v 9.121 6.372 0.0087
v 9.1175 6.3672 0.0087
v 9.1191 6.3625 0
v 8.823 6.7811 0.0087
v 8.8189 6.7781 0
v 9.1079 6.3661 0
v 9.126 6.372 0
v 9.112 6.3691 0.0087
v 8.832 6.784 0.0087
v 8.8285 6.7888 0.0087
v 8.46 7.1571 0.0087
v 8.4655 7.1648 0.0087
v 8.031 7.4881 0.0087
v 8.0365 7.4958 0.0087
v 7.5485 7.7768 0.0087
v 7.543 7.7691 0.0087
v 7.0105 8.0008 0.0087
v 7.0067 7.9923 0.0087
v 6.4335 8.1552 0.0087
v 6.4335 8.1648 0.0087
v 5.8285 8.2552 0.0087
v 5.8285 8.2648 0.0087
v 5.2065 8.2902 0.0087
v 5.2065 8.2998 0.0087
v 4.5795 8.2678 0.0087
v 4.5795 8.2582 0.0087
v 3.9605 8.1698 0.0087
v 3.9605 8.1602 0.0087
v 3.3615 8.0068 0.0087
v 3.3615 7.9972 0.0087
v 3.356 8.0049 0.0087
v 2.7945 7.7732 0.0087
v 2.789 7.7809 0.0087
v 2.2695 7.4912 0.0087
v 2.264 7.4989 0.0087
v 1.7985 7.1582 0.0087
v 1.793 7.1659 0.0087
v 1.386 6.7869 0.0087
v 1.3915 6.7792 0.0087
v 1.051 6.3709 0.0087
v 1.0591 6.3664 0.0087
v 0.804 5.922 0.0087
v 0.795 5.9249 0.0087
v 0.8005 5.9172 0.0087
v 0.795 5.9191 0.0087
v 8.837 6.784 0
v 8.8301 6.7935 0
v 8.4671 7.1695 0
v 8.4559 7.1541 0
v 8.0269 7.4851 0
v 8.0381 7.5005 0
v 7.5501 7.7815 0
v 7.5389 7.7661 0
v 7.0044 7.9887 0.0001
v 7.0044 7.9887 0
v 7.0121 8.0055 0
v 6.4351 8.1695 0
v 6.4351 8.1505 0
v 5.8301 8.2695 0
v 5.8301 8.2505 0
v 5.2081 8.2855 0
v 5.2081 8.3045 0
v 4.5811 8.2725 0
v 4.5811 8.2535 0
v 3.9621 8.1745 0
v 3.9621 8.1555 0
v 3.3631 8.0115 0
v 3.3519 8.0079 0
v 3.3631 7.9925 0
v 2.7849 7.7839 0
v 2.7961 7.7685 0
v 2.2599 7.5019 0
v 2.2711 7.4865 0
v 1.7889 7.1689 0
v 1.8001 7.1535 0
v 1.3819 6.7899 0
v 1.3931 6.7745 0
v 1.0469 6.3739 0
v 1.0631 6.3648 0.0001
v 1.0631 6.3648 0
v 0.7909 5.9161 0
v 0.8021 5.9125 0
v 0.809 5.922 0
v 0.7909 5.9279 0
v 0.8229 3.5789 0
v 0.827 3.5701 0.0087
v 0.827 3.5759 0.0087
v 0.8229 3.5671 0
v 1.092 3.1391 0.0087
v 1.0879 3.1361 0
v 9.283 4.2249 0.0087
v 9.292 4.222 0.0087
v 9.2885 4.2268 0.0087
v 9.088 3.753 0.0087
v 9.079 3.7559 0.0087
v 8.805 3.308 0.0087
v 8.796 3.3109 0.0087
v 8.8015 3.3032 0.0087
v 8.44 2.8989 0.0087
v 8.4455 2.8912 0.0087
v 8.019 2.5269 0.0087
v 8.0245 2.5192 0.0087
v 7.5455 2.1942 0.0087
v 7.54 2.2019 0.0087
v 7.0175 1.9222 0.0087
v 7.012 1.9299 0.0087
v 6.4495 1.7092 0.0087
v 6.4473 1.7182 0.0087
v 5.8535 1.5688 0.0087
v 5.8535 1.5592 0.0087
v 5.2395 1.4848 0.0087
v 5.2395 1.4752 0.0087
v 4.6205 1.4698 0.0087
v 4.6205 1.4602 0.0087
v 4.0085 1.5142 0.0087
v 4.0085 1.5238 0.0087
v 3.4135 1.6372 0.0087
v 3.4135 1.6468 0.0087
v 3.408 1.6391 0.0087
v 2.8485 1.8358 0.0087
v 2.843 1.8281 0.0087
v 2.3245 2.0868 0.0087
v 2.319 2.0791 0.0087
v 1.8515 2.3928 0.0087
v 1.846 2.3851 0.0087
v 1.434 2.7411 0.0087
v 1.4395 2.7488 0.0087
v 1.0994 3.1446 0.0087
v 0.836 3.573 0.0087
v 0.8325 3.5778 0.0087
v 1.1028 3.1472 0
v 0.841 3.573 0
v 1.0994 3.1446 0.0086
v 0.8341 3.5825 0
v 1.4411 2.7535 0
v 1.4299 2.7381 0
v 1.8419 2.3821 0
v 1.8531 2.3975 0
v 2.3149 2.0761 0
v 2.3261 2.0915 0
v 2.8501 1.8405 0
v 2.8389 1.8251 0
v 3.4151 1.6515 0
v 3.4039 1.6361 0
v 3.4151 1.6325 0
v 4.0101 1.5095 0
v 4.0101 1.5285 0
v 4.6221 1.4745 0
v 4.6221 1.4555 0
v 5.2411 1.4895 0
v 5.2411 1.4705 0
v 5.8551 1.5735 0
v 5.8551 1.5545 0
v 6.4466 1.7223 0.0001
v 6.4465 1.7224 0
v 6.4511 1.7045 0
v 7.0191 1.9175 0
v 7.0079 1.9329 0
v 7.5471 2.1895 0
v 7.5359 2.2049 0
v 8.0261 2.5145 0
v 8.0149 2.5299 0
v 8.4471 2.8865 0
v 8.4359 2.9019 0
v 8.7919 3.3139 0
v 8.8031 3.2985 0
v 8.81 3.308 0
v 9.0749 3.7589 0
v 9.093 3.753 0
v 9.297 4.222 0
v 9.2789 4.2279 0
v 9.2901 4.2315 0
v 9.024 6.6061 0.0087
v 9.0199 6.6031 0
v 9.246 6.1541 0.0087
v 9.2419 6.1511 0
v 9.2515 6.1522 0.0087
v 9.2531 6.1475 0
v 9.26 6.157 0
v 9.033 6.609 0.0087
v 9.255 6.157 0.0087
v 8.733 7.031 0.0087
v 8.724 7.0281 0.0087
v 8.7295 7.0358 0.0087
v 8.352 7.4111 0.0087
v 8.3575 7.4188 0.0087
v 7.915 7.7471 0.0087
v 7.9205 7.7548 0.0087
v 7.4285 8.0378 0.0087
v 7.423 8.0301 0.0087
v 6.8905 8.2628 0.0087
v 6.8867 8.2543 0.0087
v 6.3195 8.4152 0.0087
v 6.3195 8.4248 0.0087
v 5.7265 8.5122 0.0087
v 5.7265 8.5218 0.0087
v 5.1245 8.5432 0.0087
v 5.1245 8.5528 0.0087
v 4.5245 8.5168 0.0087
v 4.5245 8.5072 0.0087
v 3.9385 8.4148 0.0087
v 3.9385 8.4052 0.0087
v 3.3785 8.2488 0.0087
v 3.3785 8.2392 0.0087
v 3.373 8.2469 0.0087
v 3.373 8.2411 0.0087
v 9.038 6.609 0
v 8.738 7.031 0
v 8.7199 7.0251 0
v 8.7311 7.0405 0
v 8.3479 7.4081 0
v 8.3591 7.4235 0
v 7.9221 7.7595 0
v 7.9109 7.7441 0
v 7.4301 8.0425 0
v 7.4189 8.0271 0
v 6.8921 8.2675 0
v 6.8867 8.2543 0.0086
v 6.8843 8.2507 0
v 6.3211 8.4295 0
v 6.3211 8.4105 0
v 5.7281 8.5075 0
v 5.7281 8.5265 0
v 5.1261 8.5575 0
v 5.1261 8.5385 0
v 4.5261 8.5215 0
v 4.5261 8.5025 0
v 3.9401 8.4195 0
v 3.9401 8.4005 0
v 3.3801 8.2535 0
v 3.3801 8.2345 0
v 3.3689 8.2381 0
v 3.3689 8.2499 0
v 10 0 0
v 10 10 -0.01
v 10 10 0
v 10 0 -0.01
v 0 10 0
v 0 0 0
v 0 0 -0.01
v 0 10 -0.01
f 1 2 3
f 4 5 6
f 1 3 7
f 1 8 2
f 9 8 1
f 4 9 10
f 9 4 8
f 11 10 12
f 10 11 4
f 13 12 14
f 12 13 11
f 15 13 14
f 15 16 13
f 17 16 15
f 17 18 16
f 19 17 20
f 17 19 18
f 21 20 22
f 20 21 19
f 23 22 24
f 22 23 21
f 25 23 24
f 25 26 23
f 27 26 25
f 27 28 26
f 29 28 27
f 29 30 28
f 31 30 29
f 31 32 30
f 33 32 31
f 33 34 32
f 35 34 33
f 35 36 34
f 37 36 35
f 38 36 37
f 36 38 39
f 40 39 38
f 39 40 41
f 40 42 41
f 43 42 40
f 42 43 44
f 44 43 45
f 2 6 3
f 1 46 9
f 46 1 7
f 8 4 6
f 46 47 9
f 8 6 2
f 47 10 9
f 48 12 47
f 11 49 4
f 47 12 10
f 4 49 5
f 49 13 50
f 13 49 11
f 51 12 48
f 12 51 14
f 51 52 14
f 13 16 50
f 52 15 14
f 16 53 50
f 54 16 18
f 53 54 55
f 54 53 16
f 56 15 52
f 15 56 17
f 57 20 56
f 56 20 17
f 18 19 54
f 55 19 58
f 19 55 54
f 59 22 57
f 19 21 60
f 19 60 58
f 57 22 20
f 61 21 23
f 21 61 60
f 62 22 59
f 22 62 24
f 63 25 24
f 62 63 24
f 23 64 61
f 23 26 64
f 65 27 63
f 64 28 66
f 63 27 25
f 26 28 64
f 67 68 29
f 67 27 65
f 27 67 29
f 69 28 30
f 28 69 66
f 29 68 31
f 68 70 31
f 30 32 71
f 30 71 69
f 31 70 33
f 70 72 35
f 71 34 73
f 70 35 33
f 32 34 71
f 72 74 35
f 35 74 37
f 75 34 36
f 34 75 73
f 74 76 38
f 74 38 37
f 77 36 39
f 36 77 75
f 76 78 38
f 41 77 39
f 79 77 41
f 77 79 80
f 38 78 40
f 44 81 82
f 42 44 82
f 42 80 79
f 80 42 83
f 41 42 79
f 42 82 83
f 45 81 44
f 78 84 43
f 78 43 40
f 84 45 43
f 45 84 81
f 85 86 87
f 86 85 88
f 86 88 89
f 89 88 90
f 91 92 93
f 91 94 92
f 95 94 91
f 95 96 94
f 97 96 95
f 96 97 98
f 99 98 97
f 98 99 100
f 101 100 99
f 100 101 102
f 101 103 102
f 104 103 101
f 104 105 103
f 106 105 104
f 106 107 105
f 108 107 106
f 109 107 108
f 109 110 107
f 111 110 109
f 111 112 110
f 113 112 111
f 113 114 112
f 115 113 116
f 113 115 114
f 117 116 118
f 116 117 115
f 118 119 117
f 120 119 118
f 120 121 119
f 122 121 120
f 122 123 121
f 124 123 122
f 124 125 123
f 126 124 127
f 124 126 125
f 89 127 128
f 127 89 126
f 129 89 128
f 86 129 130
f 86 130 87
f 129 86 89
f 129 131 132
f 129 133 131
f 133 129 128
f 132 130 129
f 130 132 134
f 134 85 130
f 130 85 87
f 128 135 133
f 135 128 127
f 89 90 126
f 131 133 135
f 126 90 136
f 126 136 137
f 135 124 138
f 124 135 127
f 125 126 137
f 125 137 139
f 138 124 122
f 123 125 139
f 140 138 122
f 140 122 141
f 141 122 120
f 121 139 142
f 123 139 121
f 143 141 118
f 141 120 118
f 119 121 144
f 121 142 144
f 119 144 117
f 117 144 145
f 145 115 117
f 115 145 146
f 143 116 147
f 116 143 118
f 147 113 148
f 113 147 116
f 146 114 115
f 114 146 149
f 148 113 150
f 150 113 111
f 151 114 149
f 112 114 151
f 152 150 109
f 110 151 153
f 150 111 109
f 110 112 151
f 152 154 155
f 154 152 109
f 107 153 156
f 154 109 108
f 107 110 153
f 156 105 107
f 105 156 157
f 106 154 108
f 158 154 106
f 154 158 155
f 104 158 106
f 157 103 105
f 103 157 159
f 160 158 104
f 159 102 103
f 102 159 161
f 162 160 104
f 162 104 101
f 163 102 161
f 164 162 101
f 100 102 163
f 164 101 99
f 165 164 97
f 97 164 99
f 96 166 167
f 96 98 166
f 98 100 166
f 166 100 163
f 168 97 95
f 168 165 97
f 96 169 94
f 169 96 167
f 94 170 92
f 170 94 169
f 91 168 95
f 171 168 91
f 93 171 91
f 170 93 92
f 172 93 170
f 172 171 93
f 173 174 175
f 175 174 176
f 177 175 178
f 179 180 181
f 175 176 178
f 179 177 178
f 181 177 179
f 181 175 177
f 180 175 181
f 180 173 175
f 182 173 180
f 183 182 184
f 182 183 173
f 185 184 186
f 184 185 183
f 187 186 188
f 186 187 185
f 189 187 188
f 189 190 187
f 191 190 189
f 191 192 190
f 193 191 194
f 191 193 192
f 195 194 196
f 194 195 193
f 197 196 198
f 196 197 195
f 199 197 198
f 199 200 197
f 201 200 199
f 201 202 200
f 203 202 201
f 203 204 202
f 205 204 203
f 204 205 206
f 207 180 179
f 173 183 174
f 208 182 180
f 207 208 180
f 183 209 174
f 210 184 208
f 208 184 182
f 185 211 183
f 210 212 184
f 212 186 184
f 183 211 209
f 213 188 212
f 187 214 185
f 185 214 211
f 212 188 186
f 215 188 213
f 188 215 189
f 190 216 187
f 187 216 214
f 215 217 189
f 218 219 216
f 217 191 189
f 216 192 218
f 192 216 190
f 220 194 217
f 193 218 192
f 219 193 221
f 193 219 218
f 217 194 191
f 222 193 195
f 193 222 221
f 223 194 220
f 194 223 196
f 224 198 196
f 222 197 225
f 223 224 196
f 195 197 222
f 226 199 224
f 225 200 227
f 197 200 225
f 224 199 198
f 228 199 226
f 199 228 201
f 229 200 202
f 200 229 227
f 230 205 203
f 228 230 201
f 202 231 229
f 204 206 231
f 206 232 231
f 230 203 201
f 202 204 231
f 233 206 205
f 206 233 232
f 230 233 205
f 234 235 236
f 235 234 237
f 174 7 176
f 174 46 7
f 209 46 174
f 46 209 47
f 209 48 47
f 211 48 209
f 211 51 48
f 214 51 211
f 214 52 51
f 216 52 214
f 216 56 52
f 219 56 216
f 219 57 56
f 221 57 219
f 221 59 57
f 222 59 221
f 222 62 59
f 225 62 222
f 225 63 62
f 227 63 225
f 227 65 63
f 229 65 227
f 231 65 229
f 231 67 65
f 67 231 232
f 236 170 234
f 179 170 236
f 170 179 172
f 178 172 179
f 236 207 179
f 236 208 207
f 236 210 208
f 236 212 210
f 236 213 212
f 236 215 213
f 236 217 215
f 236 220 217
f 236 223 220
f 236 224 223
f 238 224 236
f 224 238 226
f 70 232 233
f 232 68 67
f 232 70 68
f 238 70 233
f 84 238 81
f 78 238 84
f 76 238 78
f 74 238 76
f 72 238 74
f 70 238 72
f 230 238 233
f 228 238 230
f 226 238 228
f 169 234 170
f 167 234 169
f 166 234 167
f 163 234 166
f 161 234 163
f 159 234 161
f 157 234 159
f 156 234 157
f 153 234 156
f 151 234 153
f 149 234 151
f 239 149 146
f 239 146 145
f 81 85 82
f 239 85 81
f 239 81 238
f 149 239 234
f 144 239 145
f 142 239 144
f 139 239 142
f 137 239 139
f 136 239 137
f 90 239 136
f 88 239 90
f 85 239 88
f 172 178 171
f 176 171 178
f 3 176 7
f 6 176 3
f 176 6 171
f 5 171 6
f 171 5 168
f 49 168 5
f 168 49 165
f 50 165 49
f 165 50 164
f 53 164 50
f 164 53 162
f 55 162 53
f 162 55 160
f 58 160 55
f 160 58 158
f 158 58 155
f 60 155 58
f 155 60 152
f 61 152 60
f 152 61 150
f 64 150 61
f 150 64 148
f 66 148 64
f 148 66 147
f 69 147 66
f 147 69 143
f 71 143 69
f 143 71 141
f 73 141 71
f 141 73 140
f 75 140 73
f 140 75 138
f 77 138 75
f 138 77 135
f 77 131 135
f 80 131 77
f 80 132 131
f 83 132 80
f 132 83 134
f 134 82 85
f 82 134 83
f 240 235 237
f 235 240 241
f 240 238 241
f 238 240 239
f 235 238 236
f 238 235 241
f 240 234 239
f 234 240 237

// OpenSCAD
hull(){
    translate([9.116, 6.372]) sphere(0.01);
    translate([8.827, 6.784]) sphere(0.01);
}
hull(){
    translate([8.827, 6.784]) sphere(0.01);
    translate([8.464, 7.16]) sphere(0.01);
}
hull(){
    translate([8.464, 7.16]) sphere(0.01);
    translate([8.035, 7.491]) sphere(0.01);
}
hull(){
    translate([8.035, 7.491]) sphere(0.01);
    translate([7.547, 7.772]) sphere(0.01);
}
hull(){
    translate([7.547, 7.772]) sphere(0.01);
    translate([7.009, 7.996]) sphere(0.01);
}
hull(){
    translate([7.009, 7.996]) sphere(0.01);
    translate([6.432, 8.16]) sphere(0.01);
}
hull(){
    translate([6.432, 8.16]) sphere(0.01);
    translate([5.827, 8.26]) sphere(0.01);
}
hull(){
    translate([5.827, 8.26]) sphere(0.01);
    translate([5.205, 8.295]) sphere(0.01);
}
hull(){
    translate([5.205, 8.295]) sphere(0.01);
    translate([4.578, 8.263]) sphere(0.01);
}
hull(){
    translate([4.578, 8.263]) sphere(0.01);
    translate([3.959, 8.165]) sphere(0.01);
}
hull(){
    translate([3.959, 8.165]) sphere(0.01);
    translate([3.36, 8.002]) sphere(0.01);
}
hull(){
    translate([3.36, 8.002]) sphere(0.01);
    translate([2.793, 7.778]) sphere(0.01);
}
hull(){
    translate([2.793, 7.778]) sphere(0.01);
    translate([2.268, 7.496]) sphere(0.01);
}
hull(){
    translate([2.268, 7.496]) sphere(0.01);
    translate([1.797, 7.163]) sphere(0.01);
}
hull(){
    translate([1.797, 7.163]) sphere(0.01);
    translate([1.39, 6.784]) sphere(0.01);
}
hull(){
    translate([1.39, 6.784]) sphere(0.01);
    translate([1.055, 6.368]) sphere(0.01);
}
hull(){
    translate([1.055, 6.368]) sphere(0.01);
    translate([0.799, 5.922]) sphere(0.01);
}
hull(){
    translate([0.831, 3.573]) sphere(0.01);
    translate([1.096, 3.142]) sphere(0.01);
}
hull(){
    translate([1.096, 3.142]) sphere(0.01);
    translate([1.438, 2.744]) sphere(0.01);
}
hull(){
    translate([1.438, 2.744]) sphere(0.01);
    translate([1.85, 2.388]) sphere(0.01);
}
hull(){
    translate([1.85, 2.388]) sphere(0.01);
    translate([2.323, 2.082]) sphere(0.01);
}
hull(){
    translate([2.323, 2.082]) sphere(0.01);
    translate([2.847, 1.831]) sphere(0.01);
}
hull(){
    translate([2.847, 1.831]) sphere(0.01);
    translate([3.412, 1.642]) sphere(0.01);
}
hull(){
    translate([3.412, 1.642]) sphere(0.01);
    translate([4.007, 1.519]) sphere(0.01);
}
hull(){
    translate([4.007, 1.519]) sphere(0.01);
    translate([4.619, 1.465]) sphere(0.01);
}
hull(){
    translate([4.619, 1.465]) sphere(0.01);
    translate([5.238, 1.48]) sphere(0.01);
}
hull(){
    translate([5.238, 1.48]) sphere(0.01);
    translate([5.852, 1.564]) sphere(0.01);
}
hull(){
    translate([5.852, 1.564]) sphere(0.01);
    translate([6.448, 1.714]) sphere(0.01);
}
hull(){
    translate([6.448, 1.714]) sphere(0.01);
    translate([7.016, 1.927]) sphere(0.01);
}
hull(){
    translate([7.016, 1.927]) sphere(0.01);
    translate([7.544, 2.199]) sphere(0.01);
}
hull(){
    translate([7.544, 2.199]) sphere(0.01);
    translate([8.023, 2.524]) sphere(0.01);
}
hull(){
    translate([8.023, 2.524]) sphere(0.01);
    translate([8.444, 2.896]) sphere(0.01);
}
hull(){
    translate([8.444, 2.896]) sphere(0.01);
    translate([8.8, 3.308]) sphere(0.01);
}
hull(){
    translate([8.8, 3.308]) sphere(0.01);
    translate([9.083, 3.753]) sphere(0.01);
}
hull(){
    translate([9.083, 3.753]) sphere(0.01);
    translate([9.287, 4.222]) sphere(0.01);
}
hull(){
    translate([9.25, 6.157]) sphere(0.01);
    translate([9.028, 6.609]) sphere(0.01);
}
hull(){
    translate([9.028, 6.609]) sphere(0.01);
    translate([8.728, 7.031]) sphere(0.01);
}
hull(){
    translate([8.728, 7.031]) sphere(0.01);
    translate([8.356, 7.414]) sphere(0.01);
}
hull(){
    translate([8.356, 7.414]) sphere(0.01);
    translate([7.919, 7.75]) sphere(0.01);
}
hull(){
    translate([7.919, 7.75]) sphere(0.01);
    translate([7.427, 8.033]) sphere(0.01);
}
hull(){
    translate([7.427, 8.033]) sphere(0.01);
    translate([6.889, 8.258]) sphere(0.01);
}
hull(){
    translate([6.889, 8.258]) sphere(0.01);
    translate([6.318, 8.42]) sphere(0.01);
}
hull(){
    translate([6.318, 8.42]) sphere(0.01);
    translate([5.725, 8.517]) sphere(0.01);
}
hull(){
    translate([5.725, 8.517]) sphere(0.01);
    translate([5.123, 8.548]) sphere(0.01);
}
hull(){
    translate([5.123, 8.548]) sphere(0.01);
    translate([4.523, 8.512]) sphere(0.01);
}
hull(){
    translate([4.523, 8.512]) sphere(0.01);
    translate([3.937, 8.41]) sphere(0.01);
}
hull(){
    translate([3.937, 8.41]) sphere(0.01);
    translate([3.377, 8.244]) sphere(0.01);
}
translate([0,0,-0.01]) color([0.1,0.1,0.1]) cube([10,10,0.01]);
